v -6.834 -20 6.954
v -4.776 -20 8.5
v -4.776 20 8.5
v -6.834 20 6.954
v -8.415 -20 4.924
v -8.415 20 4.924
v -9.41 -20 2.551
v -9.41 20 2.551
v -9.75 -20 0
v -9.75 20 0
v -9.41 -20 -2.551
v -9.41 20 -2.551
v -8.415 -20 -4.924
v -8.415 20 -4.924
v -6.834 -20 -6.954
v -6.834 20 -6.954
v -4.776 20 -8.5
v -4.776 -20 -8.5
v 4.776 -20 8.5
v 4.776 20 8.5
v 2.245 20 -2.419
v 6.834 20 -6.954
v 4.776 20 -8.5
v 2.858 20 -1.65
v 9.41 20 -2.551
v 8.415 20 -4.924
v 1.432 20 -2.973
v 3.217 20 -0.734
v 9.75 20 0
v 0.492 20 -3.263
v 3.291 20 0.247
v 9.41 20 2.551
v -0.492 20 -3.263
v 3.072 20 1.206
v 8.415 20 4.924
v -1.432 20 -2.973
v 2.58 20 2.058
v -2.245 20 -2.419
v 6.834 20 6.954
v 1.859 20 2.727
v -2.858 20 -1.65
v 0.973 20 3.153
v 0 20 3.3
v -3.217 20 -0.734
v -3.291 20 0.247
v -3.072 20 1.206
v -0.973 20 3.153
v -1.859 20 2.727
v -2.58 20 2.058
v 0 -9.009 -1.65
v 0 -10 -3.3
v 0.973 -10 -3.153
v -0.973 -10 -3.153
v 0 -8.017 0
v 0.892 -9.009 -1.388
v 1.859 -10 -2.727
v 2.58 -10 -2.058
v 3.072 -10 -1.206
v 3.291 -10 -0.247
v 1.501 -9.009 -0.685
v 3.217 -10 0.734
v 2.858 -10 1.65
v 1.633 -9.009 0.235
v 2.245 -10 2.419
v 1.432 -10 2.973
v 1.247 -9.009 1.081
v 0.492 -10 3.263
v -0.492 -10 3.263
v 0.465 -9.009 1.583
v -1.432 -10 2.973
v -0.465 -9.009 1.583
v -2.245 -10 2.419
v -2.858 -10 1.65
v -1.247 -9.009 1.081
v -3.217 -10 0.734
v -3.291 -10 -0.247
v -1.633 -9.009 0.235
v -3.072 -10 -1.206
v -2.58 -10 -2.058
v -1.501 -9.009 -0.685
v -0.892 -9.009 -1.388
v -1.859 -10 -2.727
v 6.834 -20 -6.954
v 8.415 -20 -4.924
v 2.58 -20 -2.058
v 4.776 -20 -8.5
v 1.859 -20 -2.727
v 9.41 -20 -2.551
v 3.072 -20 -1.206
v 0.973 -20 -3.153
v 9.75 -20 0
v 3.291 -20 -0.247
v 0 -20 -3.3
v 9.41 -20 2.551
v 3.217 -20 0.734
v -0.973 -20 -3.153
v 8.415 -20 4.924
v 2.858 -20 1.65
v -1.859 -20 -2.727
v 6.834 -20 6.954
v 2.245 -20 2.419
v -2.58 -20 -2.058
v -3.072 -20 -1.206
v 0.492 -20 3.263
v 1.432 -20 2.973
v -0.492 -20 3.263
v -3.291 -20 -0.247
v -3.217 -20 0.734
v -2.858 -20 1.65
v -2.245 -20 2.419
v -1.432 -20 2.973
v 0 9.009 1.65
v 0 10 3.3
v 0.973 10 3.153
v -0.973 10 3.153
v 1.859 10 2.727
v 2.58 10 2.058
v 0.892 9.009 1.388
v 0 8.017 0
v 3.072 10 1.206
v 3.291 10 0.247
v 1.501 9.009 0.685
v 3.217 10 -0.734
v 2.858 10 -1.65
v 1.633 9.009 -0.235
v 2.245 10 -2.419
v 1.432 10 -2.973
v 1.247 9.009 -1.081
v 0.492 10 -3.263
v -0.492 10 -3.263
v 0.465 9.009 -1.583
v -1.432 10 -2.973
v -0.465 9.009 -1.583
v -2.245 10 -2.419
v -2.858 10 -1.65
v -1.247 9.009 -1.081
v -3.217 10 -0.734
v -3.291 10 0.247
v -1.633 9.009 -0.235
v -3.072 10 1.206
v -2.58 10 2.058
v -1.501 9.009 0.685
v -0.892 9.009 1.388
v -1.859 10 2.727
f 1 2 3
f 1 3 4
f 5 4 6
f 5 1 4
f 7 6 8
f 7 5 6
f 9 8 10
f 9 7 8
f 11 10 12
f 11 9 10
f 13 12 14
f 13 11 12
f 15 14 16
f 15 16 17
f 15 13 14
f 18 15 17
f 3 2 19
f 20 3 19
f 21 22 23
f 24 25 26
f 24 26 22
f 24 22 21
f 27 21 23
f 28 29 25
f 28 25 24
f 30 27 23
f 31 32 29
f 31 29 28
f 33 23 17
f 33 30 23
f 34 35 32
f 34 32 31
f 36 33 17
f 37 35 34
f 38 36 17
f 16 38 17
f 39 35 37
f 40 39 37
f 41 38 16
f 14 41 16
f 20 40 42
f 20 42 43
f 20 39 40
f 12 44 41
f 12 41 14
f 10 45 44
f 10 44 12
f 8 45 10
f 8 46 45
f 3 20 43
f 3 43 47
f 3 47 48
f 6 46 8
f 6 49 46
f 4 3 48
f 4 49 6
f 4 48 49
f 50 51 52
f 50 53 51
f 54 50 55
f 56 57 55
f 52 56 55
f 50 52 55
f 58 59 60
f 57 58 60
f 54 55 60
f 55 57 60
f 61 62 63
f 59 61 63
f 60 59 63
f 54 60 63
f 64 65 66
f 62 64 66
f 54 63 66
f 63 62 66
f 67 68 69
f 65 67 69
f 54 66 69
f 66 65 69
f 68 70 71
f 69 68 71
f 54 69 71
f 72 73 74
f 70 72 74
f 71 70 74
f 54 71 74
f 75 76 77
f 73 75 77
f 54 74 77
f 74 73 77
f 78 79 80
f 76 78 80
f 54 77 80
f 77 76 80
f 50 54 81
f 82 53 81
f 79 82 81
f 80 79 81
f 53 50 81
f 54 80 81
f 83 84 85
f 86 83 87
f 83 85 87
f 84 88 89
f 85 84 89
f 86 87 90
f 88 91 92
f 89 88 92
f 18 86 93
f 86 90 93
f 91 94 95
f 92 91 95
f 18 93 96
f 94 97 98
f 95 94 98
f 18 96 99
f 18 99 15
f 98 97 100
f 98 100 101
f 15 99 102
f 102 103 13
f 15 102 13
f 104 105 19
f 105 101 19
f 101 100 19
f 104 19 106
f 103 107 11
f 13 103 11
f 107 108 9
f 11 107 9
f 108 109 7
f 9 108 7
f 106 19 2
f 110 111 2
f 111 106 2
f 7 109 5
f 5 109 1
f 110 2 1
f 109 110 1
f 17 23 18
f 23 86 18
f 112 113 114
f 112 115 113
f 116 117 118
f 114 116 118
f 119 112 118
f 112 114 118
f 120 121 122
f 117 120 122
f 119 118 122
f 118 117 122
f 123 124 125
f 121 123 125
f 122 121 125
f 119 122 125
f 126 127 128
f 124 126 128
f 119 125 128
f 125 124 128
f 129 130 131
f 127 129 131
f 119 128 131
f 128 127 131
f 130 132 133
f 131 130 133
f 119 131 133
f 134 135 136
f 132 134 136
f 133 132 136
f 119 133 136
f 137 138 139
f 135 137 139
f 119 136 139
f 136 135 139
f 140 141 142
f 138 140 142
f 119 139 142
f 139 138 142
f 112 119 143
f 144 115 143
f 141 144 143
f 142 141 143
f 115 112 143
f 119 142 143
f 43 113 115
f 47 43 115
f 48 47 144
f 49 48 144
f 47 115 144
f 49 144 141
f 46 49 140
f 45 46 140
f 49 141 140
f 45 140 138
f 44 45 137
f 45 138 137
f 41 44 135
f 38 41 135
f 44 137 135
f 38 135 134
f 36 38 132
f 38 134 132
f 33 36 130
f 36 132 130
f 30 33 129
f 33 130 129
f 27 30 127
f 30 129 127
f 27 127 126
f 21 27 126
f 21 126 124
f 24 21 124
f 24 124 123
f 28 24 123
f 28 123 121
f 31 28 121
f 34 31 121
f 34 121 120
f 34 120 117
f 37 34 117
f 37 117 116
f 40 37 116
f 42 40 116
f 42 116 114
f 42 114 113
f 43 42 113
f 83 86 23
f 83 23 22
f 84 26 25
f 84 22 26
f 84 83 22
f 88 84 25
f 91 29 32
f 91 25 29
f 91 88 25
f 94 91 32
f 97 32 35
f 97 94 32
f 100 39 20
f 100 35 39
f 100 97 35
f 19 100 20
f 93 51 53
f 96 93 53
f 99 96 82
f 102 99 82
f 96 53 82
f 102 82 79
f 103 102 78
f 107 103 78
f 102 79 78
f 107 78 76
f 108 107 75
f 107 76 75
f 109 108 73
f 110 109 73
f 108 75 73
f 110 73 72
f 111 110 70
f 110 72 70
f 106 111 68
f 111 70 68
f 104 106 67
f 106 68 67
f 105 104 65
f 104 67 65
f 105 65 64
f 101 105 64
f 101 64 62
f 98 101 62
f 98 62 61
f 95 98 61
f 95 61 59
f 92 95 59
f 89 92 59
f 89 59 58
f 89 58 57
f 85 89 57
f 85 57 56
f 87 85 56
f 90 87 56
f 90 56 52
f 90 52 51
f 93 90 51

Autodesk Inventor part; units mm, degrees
ref_plane "YZ Plane" through (0, 0, 0) normal (1, 0, 0) x (0, 1, 0)
ref_plane "XZ Plane" through (0, 0, 0) normal (0, 1, 0) x (-1, 0, 0)
ref_plane "XY Plane" through (0, 0, 0) normal (0, 0, 1) x (1, 0, 0)
sketch "Sketch1" plane through (0, 0, 0) normal (0, 1, 0) x (-1, 0, 0)
  circle A0 centre (0, 0) radius 9.75
  line L0 (-9.75, -8.5) -> (9.75, -8.5)
  line L1 (9.75, -8.5) -> (9.75, 8.5)
  line L2 (9.75, 8.5) -> (-9.75, 8.5)
  line L3 (-9.75, 8.5) -> (-9.75, -8.5)
  line L4 (-9.75, -8.5) -> (9.75, 8.5) construction
  line L5 (9.75, -8.5) -> (-9.75, 8.5) construction
  point P0 (4.7762, 8.5)
  point P1 (-4.7762, 8.5)
  point P2 (-4.7762, -8.5)
  point P3 (4.7762, -8.5)
  dimension "d18" = 19.5
  dimension "d19" = 17
extrude "Extrusion1" add sketch "Sketch1" along normal mid plane 40 contours A0 L0 L2
sketch "Sketch2" plane through (0, 20, 0) normal (0, 1, 0) x (1, 0, 0)
  point P0 (0, 0)
hole "Hole1" at (0, 20, 0) direction (0, -1, 0) diameter 6.6 depth 10 tip angle 118 clearance for "Countersunk Flat Head Screw ISO 2009/7046" size "M6" standard "ISO"
sketch "Sketch3" plane through (0, -20, 0) normal (0, -1, 0) x (1, 0, 0)
  point P0 (0, 0)
hole "Hole2" at (0, -20, 0) direction (0, 1, 0) diameter 6.6 depth 10 tip angle 118 clearance for "Countersunk Flat Head Screw ISO 2009/7046" size "M6" standard "ISO"
properties part number "SP35V1 Vastago Cierre"
